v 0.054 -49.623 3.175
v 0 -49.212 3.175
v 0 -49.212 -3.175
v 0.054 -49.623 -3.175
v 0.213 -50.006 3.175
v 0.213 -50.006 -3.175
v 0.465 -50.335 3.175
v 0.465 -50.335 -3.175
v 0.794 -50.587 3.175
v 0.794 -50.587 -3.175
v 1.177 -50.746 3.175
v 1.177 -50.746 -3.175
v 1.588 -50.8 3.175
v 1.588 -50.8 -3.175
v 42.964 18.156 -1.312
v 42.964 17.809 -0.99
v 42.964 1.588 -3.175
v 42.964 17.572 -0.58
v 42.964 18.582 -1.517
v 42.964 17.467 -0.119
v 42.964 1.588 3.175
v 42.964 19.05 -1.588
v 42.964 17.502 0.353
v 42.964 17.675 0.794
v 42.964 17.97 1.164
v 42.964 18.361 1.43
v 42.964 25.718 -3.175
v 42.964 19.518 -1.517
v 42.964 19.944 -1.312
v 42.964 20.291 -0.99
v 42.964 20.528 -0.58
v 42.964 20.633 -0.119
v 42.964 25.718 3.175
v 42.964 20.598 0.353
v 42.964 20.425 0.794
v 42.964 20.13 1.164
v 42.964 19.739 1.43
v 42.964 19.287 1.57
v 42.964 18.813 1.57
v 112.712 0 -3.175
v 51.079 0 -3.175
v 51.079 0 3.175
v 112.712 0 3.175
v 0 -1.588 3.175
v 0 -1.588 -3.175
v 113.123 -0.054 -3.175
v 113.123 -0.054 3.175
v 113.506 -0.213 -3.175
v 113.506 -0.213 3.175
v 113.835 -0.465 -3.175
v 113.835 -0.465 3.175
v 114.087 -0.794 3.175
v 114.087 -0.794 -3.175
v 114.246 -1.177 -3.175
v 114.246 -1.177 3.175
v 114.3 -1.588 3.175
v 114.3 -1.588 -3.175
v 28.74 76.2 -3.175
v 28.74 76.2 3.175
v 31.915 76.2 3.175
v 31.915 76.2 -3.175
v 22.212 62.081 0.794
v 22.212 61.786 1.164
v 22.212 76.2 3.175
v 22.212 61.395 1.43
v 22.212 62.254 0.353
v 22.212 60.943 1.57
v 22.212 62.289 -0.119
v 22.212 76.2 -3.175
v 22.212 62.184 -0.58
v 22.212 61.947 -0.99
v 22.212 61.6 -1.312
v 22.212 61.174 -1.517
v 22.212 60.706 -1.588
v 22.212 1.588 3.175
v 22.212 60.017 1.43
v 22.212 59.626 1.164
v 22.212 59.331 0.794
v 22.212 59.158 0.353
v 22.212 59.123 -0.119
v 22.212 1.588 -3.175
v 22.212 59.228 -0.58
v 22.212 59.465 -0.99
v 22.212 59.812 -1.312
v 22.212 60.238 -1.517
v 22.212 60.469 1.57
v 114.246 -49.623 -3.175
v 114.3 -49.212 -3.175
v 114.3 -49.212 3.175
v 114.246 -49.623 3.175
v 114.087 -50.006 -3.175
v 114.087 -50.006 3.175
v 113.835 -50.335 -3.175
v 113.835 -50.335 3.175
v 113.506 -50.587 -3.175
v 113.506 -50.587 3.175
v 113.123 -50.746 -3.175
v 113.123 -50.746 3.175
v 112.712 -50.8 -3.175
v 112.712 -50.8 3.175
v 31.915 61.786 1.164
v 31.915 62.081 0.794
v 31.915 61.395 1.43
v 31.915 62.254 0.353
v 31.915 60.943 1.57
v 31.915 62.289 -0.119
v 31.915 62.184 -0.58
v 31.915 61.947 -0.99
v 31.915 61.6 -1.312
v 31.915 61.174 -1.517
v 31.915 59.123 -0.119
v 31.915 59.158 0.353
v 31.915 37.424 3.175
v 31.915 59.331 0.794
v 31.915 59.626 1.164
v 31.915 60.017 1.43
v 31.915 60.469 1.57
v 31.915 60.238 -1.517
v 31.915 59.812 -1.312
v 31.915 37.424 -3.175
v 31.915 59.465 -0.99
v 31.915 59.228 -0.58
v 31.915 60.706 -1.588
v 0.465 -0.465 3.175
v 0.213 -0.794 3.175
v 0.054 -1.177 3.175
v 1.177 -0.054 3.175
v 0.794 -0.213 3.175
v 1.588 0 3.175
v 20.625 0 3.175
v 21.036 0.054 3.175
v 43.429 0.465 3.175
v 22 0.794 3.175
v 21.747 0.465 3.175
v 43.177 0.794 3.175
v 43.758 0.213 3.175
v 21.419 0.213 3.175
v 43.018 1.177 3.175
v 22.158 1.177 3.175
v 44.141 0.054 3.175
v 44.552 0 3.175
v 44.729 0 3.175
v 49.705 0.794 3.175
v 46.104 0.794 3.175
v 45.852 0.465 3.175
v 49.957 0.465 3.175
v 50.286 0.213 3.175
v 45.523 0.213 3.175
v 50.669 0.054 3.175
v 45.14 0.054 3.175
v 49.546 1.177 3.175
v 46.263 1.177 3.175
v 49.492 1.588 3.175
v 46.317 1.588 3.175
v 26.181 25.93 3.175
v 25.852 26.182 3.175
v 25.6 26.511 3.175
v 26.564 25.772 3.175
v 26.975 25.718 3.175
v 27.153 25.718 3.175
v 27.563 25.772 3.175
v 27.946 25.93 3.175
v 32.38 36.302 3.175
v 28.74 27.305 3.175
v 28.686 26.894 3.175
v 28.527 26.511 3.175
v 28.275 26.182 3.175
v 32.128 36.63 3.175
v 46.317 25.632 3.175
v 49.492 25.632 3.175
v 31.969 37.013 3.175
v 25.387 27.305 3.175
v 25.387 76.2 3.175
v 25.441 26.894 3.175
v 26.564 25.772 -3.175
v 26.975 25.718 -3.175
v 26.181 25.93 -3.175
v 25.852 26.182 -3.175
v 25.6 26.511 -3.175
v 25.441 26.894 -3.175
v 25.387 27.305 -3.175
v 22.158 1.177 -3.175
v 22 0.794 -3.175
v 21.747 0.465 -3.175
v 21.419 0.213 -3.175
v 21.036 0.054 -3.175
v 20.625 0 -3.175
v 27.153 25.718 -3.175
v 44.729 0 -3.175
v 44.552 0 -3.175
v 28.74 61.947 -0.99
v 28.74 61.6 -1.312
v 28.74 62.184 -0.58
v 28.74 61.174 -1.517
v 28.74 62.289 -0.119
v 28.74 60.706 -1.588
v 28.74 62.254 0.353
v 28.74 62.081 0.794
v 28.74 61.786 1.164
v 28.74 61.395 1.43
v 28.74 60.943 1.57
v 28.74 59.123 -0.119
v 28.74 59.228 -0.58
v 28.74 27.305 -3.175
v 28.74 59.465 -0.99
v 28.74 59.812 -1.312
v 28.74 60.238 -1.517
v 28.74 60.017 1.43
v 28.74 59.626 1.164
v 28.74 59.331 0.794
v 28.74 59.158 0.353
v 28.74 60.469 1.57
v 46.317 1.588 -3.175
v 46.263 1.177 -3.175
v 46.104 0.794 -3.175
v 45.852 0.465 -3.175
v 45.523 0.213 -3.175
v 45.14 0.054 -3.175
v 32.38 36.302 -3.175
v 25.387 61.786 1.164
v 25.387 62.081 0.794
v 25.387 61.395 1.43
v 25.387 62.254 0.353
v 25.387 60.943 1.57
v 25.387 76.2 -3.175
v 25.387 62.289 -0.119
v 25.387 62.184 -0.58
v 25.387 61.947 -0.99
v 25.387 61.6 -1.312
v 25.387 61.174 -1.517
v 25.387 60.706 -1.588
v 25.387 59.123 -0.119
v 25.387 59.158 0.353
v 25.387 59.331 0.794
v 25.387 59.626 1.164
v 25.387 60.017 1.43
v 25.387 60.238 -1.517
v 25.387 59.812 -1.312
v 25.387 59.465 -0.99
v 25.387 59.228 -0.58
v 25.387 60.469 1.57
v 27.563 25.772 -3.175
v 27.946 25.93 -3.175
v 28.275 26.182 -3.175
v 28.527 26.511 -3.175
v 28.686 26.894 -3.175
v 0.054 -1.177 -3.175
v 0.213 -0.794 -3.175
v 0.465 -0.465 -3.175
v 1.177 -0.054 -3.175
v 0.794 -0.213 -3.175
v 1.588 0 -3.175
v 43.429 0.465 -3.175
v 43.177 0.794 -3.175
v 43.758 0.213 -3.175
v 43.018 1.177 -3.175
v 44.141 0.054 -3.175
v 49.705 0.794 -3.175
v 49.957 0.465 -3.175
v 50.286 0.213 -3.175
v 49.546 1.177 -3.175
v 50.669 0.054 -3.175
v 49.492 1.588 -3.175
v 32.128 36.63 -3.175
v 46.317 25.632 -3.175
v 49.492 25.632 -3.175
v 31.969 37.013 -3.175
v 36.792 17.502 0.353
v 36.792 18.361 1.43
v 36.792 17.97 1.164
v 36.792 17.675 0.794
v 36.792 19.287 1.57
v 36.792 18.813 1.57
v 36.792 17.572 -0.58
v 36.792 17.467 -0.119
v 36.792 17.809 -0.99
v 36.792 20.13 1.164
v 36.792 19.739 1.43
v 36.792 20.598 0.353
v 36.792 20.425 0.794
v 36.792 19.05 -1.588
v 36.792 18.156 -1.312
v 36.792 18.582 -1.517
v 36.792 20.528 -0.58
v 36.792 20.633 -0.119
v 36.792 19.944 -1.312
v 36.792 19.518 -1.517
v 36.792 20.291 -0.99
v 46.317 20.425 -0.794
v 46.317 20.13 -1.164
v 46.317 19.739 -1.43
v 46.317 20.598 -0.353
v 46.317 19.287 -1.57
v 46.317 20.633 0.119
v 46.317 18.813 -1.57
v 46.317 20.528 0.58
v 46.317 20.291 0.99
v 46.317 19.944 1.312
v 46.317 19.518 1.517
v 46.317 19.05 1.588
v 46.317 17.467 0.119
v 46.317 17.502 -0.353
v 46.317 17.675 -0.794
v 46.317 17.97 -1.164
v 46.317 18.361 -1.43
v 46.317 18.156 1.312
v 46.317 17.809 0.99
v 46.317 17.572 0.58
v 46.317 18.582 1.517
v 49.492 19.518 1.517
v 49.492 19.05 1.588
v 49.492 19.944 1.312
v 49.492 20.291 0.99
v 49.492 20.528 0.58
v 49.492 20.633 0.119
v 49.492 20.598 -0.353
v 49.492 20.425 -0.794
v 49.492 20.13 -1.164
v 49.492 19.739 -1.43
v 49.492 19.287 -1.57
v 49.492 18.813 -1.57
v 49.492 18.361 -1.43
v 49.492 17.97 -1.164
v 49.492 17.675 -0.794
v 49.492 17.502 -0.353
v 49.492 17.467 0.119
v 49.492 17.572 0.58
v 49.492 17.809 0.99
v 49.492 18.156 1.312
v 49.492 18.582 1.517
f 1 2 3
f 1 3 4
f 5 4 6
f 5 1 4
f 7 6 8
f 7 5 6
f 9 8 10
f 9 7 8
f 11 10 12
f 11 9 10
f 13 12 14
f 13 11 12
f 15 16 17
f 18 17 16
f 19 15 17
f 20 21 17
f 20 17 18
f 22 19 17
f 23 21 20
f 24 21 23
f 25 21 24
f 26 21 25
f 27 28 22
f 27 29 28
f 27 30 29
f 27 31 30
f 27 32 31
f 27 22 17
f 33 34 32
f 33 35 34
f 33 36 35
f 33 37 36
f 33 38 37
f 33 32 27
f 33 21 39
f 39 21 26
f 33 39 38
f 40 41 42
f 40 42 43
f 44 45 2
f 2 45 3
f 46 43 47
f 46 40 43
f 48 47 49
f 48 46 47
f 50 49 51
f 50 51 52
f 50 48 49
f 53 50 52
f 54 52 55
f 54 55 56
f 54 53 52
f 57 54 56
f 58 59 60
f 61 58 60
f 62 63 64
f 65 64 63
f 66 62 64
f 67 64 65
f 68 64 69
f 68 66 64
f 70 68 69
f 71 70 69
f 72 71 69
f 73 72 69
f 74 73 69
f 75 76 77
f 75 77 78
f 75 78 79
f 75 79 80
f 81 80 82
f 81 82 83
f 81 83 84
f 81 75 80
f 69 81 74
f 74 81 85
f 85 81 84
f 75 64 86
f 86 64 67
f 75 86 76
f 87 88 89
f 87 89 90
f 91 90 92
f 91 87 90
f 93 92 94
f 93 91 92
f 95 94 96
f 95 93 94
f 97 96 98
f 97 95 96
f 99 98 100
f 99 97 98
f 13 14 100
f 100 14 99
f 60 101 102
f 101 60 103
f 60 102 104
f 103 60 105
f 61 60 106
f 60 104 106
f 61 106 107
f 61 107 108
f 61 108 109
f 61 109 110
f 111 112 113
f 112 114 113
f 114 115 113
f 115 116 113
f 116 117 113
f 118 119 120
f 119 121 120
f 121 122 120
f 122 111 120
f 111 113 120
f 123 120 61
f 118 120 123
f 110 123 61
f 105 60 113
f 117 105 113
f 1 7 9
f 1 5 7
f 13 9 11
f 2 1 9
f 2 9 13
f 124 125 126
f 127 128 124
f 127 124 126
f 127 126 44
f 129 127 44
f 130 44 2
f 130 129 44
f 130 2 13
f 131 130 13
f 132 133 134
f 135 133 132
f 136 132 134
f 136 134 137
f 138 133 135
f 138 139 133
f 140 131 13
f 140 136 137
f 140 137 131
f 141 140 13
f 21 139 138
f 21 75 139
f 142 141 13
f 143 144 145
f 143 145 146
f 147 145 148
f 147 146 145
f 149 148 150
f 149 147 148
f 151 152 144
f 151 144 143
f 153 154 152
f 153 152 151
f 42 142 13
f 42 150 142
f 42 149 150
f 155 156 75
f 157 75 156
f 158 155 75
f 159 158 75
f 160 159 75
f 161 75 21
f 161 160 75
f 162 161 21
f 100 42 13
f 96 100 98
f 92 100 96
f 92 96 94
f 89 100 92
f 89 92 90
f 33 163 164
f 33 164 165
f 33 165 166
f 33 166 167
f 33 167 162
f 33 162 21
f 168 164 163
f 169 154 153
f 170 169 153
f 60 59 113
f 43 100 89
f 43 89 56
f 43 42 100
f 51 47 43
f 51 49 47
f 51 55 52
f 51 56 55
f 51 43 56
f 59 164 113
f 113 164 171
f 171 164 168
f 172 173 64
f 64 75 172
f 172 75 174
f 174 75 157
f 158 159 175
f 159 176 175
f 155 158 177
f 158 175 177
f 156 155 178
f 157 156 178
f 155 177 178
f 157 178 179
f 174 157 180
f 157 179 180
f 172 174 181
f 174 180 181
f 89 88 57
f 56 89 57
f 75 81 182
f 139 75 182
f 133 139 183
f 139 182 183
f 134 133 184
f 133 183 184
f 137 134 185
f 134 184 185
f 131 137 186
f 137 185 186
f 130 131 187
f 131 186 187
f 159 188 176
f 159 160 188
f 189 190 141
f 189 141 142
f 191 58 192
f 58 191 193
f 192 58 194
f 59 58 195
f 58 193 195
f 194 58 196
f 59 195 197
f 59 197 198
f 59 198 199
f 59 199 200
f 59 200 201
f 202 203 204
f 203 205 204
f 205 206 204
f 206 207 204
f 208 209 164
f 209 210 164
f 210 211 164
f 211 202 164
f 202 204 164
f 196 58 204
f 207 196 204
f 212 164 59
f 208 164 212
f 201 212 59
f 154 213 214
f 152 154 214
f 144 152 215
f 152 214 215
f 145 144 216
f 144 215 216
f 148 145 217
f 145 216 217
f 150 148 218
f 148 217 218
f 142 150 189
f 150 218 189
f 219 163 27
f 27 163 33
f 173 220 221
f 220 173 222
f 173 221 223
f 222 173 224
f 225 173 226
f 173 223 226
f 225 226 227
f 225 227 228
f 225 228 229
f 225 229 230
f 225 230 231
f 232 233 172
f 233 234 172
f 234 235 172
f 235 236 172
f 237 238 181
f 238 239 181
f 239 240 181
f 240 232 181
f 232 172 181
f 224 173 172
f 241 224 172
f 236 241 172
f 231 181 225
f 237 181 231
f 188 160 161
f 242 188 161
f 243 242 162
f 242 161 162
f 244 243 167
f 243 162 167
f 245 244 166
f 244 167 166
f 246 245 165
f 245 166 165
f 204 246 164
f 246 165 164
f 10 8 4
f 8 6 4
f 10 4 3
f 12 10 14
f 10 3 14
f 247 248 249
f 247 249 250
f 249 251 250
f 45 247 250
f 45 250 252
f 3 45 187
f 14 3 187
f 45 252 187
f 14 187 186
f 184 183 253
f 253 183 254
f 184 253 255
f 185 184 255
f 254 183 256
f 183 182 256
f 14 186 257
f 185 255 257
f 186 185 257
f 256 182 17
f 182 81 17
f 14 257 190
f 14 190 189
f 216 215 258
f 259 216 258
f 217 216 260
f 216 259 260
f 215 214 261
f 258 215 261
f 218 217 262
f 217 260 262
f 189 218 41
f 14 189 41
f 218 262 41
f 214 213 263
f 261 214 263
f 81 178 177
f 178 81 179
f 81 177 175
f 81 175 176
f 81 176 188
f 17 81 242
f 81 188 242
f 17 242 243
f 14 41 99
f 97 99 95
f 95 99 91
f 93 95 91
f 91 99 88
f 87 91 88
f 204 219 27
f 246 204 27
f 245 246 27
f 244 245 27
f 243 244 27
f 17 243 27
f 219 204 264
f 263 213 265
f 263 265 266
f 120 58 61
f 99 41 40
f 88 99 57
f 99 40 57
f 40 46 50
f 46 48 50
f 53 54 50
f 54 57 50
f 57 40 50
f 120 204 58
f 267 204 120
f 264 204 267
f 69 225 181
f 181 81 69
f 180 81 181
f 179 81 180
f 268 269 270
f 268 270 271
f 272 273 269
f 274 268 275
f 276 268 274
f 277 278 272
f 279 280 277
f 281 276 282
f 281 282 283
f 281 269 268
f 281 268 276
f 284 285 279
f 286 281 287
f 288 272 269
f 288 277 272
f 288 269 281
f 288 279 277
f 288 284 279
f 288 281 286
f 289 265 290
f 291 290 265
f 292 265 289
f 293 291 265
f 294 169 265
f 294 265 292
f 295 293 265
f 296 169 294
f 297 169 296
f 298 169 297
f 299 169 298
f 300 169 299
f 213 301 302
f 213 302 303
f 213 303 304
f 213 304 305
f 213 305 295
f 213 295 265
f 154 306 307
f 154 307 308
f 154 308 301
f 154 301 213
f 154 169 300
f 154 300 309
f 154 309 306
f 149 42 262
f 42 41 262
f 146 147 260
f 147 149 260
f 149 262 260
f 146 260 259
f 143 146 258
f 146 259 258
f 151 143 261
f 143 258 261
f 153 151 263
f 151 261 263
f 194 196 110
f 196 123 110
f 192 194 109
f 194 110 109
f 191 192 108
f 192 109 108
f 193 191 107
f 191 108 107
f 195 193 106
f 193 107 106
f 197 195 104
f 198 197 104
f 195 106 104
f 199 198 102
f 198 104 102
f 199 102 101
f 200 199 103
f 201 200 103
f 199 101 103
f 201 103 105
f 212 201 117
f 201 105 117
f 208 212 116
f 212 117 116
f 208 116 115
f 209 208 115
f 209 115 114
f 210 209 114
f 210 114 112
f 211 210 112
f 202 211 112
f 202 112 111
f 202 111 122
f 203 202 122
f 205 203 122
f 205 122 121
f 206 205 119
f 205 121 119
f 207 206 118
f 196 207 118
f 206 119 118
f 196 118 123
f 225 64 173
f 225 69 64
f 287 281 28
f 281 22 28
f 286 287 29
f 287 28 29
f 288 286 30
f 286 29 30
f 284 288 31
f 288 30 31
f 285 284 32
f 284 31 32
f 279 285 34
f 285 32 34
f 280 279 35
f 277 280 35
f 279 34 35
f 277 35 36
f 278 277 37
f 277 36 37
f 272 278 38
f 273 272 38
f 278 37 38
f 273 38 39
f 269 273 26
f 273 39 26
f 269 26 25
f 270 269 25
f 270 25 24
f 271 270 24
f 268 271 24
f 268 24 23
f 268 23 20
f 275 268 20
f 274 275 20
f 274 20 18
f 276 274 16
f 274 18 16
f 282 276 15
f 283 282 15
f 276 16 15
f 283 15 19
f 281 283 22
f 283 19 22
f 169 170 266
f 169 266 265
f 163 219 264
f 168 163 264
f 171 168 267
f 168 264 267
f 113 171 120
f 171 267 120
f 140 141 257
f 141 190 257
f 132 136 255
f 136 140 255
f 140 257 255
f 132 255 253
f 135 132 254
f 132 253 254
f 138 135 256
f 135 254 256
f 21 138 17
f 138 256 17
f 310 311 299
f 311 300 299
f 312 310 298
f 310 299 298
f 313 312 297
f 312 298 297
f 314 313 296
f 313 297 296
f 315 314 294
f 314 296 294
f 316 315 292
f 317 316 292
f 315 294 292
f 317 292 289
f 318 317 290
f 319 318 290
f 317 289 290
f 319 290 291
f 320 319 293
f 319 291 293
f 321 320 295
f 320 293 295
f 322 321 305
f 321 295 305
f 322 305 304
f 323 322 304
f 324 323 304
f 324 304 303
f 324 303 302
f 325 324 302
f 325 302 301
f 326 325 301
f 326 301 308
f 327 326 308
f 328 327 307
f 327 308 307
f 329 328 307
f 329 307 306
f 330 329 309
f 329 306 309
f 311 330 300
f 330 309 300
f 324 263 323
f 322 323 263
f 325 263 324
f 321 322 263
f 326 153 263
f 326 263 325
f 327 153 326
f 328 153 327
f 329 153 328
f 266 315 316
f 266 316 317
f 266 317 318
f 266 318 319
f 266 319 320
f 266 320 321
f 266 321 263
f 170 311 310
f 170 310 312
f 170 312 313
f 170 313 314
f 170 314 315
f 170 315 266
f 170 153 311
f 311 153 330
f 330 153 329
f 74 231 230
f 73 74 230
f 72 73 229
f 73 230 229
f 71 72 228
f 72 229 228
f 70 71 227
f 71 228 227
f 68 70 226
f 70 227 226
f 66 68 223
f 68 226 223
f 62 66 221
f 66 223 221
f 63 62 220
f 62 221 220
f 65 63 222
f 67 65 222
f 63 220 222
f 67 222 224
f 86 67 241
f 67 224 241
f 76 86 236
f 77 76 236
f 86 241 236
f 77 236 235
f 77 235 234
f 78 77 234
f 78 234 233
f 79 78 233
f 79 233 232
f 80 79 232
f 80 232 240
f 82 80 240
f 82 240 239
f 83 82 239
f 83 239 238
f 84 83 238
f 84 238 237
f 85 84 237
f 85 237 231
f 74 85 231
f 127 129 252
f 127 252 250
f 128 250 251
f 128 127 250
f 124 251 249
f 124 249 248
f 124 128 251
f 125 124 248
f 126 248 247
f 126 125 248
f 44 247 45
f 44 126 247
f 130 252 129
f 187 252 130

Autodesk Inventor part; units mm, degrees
ref_plane "YZ Plane" through (0, 0, 0) normal (1, 0, 0) x (0, 1, 0)
ref_plane "XZ Plane" through (0, 0, 0) normal (0, 1, 0) x (-1, 0, 0)
ref_plane "XY Plane" through (0, 0, 0) normal (0, 0, 1) x (1, 0, 0)
sketch "Sketch1" plane through (0, 0, 0) normal (0, 0, 1) x (1, 0, 0)
  line L0 (0, 0) -> (114.3, 0)
  line L1 (0, 0) -> (0, -50.8)
  line L2 (0, -50.8) -> (114.3, -50.8)
  line L3 (114.3, -50.8) -> (114.3, 0)
  dimension "d1" = 114.3
  dimension "d2" = 50.8
  dimension "d3" = 114.3
extrude "Extrusion1" add sketch "Sketch1" along normal blind 3.175
sketch "Sketch2" plane through (0, 0, 0) normal (0, 1, 0) x (1, 0, 0)
  line L0 (114.3, -3.175) -> (0, -3.175) projected
  line L1 (25.3873, -1.5875) -> (25.3873, 0)
  line L2 (25.3873, -3.175) -> (25.3873, -1.5875)
  line L3 (28.7401, -1.5875) -> (28.7401, -3.175)
  line L4 (28.7401, -1.5875) -> (28.7401, 0)
  line L5 (25.3873, -3.175) -> (22.2123, -3.175)
  line L6 (22.2123, -3.175) -> (22.2123, 3.175)
  line L7 (28.7401, -3.175) -> (31.9151, -3.175)
  line L8 (31.9151, -3.175) -> (31.9151, 3.175)
  line L9 (25.3873, 0) -> (25.3873, 3.175)
  line L10 (25.3873, 3.175) -> (22.2123, 3.175)
  line L11 (31.9151, 3.175) -> (28.7401, 3.175)
  line L12 (28.7401, 3.175) -> (28.7401, 0)
  point P0 (27.0637, -1.5875)
  dimension "d7" = 1.6764
  dimension "d8" = 1.6764
  dimension "d9" = 3.175
  dimension "d10" = 6.35
  dimension "d11" = 3.175
sketch "Sketch3" plane through (0, 0, 0) normal (0, 0, -1) x (-1, 0, 0)
  line L0 (-114.3, 0) -> (0, 0) projected
  line L1 (0, -50.8) -> (-114.3, -50.8) projected
  line L2 (0, 0) -> (-114.3, 0)
  line L3 (-114.3, 0) -> (-114.3, -50.8)
  line L4 (-114.3, -50.8) -> (0, -50.8)
  line L5 (0, -50.8) -> (0, 0)
extrude "Extrusion2" add sketch "Sketch3" along normal blind 3.175
extrude "Extrusion3" add sketch "Sketch2" along normal blind 76.2 contours L0 L3 L4 L12 L11 L8
extrude "Extrusion4" add sketch "Sketch2" along normal blind 76.2 contours L0 L6 L10 L9 L1 L2
sketch "Sketch4" plane through (31.9151, 0, 3.175) normal (1, 0, 0) x (0, 0, -1)
  line L0 (3.175, 0) -> (3.175, 19.05)
  circle A0 centre (3.175, 19.05) radius 1.5875
  dimension "d18" = 19.05
  dimension "d19" = 3.175
extrude "Extrusion5" cut sketch "Sketch4" along normal mid plane 50.8
sketch "Sketch5" plane through (31.9151, 0, 3.175) normal (1, 0, 0) x (0, 0, -1)
  circle A0 centre (3.175, 19.05) radius 1.5875 projected
  line L0 (3.175, 19.05) -> (3.175, 60.706)
  circle A1 centre (3.175, 60.706) radius 1.5875
  point P0 (3.175, 0)
  dimension "d22" = 41.656
  dimension "d23" = 3.175
extrude "Extrusion6" cut sketch "Sketch5" against normal blind 50.8 contours A1
sketch "Sketch6" plane through (25.3873, 0, 3.175) normal (1, 0, 0) x (0, 0, -1)
  point P0 (3.175, 0)
sketch "Sketch7" plane through (0, 0, 3.175) normal (0, 0, 1) x (1, 0, 0)
  point P0 (0, 0)
sketch "Sketch8" plane through (0, 0, 3.175) normal (0, 0, 1) x (1, 0, 0)
  line L0 (38.0873, 0) -> (41.2623, 0)
  line L1 (41.2623, 0) -> (41.2623, 22.5425)
  line L2 (38.0873, 0) -> (38.0873, 22.5425)
  line L3 (38.0873, 22.5425) -> (41.2623, 22.5425)
  line L4 (38.0873, 22.5425) -> (31.9151, 22.5425)
  line L5 (31.9151, 0) -> (31.9151, 76.2) projected
  line L6 (41.2623, 22.5425) -> (41.2623, 25.7175)
  line L7 (41.2623, 25.7175) -> (31.9151, 25.7175)
  point P0 (0, 0)
  dimension "d30" = 3.175
  dimension "d34" = 3.175
sketch "Sketch9" plane through (0, 0, 3.175) normal (0, 0, 1) x (1, 0, 0)
  line L0 (41.2623, 25.7175) -> (41.2623, 0) projected
  line L1 (31.9151, 0) -> (114.3, 0) projected
  line L2 (44.6151, 0) -> (44.6151, 25.6324)
  line L3 (44.6151, 25.6324) -> (47.7901, 25.6324)
  line L4 (47.7901, 0) -> (47.7901, 25.6324)
  line L5 (44.6151, 0) -> (47.7901, 0)
  point P0 (0, 0)
  dimension "d35" = 3.3528
  dimension "d36" = 3.175
sketch "Sketch12" plane through (0, 0, 3.175) normal (0, 0, 1) x (1, 0, 0)
  line L0 (44.6151, 0) -> (44.6151, 25.6324) projected
  line L1 (44.6151, 0) -> (46.3169, 0)
  line L2 (46.3169, 0) -> (49.4919, 0)
  line L3 (25.3873, 0) -> (114.3, 0) projected
  line L4 (49.4919, 0) -> (49.4919, 25.6324)
  line L5 (49.4919, 25.6324) -> (46.3169, 25.6324)
  line L6 (46.3169, 25.6324) -> (46.3169, 0)
  point P0 (0, 0)
  point P1 (47.7901, 0)
  point P2 (41.2623, 0)
  dimension "d44" = 1.7018
  dimension "d45" = 3.175
extrude "Extrusion11" add sketch "Sketch12" against normal blind 6.35
sketch "Sketch13" plane through (0, 0, 3.175) normal (0, 0, 1) x (1, 0, 0)
  line L0 (38.0873, 22.5425) -> (38.0873, 0) projected
  line L1 (38.0873, 0) -> (39.7891, 0)
  line L2 (39.7891, 0) -> (42.9641, 0)
  line L3 (46.3169, 0) -> (31.9151, 0) projected
  line L4 (39.7891, 0) -> (39.7891, 25.7175)
  line L5 (41.2623, 25.7175) -> (31.9151, 25.7175) projected
  line L6 (42.9641, 0) -> (42.9641, 25.7175)
  line L7 (42.9641, 25.7175) -> (39.7891, 25.7175)
  point P0 (0, 0)
  point P1 (41.2623, 0)
  dimension "d48" = 1.7018
  dimension "d49" = 3.175
extrude "Extrusion12" add sketch "Sketch13" against normal blind 6.35
sketch "Sketch14" plane through (0, 0, 3.175) normal (0, 0, 1) x (1, 0, 0)
  line L0 (39.7891, 25.7175) -> (42.9641, 25.7175) projected
  line L1 (39.7891, 25.7175) -> (39.7891, 22.5425)
  line L2 (39.7891, 25.7175) -> (39.7891, 0) projected
  line L3 (39.7891, 22.5425) -> (31.9151, 22.5425)
  line L4 (39.7891, 25.7175) -> (50.9246, 25.7175) construction
  line L5 (42.9641, 25.7175) -> (56.7757, 25.7175) construction
  line L6 (31.9151, 0) -> (31.9151, 76.2) projected
  line L7 (31.9151, 36.7665) -> (42.9641, 25.7175)
  line L8 (31.9151, 36.7665) -> (31.9151, 22.5425)
  line L9 (42.9641, 25.7175) -> (39.7891, 25.7175) projected
  line L10 (39.7891, 25.7175) -> (42.9641, 25.7175)
  point P0 (0, 0)
  dimension "d52" = 3.175
extrude "Extrusion13" add sketch "Sketch14" against normal blind 6.35
sketch "Sketch15" plane through (22.2123, 0, -3.175) normal (-1, 0, 0) x (0, 0, 1)
  circle A0 centre (3.175, 19.05) radius 1.5875 projected
  circle A1 centre (3.175, 19.05) radius 1.5875
  point P0 (3.175, 0)
extrude "Extrusion14" cut sketch "Sketch15" against normal blind 50.8
sketch "Sketch16" plane through (0, 0, 3.175) normal (0, 0, 1) x (1, 0, 0)
  line L0 (31.9151, 36.7665) -> (42.9641, 25.7175) projected
  line L1 (42.9641, 25.7175) -> (22.2123, 25.7175)
  line L2 (22.2123, 0) -> (22.2123, 76.2) projected
  line L3 (42.9641, 25.7175) -> (42.9641, 0) projected
  line L4 (42.9641, 0) -> (22.2123, 0)
  line L5 (22.2123, 0) -> (22.2123, 25.7175)
  line L6 (42.9641, 25.7175) -> (42.9641, 0)
  point P0 (0, 0)
extrude "Extrusion15" add sketch "Sketch16" against normal blind 6.35
sketch "Sketch17" plane through (49.4919, 0, 3.175) normal (1, 0, 0) x (0, 0, -1)
  circle A0 centre (3.175, 19.05) radius 1.5875 projected
  circle A1 centre (3.175, 19.05) radius 1.5875
  point P0 (3.175, 0)
extrude "Extrusion16" cut sketch "Sketch17" against normal blind 12.7
fillet "Fillet1" radius 1.5875 2 edges at (42.9641, 0, 0) (46.3169, 0, 0)
fillet "Fillet2" radius 1.5875 8 edges at (25.3873, 25.7175, 0) (28.7401, 25.7175, 0) (22.2123, 0, 0) (0, 0, 0) (49.4919, 0, 0) (114.3, 0, 0) (114.3, -50.8, 0) (0, -50.8, 0)
fillet "Fillet3" radius 1.5875 1 edges at (31.9151, 36.7665, 0)
properties part number "2BarClawPaddle" material "Aluminum 6061"
